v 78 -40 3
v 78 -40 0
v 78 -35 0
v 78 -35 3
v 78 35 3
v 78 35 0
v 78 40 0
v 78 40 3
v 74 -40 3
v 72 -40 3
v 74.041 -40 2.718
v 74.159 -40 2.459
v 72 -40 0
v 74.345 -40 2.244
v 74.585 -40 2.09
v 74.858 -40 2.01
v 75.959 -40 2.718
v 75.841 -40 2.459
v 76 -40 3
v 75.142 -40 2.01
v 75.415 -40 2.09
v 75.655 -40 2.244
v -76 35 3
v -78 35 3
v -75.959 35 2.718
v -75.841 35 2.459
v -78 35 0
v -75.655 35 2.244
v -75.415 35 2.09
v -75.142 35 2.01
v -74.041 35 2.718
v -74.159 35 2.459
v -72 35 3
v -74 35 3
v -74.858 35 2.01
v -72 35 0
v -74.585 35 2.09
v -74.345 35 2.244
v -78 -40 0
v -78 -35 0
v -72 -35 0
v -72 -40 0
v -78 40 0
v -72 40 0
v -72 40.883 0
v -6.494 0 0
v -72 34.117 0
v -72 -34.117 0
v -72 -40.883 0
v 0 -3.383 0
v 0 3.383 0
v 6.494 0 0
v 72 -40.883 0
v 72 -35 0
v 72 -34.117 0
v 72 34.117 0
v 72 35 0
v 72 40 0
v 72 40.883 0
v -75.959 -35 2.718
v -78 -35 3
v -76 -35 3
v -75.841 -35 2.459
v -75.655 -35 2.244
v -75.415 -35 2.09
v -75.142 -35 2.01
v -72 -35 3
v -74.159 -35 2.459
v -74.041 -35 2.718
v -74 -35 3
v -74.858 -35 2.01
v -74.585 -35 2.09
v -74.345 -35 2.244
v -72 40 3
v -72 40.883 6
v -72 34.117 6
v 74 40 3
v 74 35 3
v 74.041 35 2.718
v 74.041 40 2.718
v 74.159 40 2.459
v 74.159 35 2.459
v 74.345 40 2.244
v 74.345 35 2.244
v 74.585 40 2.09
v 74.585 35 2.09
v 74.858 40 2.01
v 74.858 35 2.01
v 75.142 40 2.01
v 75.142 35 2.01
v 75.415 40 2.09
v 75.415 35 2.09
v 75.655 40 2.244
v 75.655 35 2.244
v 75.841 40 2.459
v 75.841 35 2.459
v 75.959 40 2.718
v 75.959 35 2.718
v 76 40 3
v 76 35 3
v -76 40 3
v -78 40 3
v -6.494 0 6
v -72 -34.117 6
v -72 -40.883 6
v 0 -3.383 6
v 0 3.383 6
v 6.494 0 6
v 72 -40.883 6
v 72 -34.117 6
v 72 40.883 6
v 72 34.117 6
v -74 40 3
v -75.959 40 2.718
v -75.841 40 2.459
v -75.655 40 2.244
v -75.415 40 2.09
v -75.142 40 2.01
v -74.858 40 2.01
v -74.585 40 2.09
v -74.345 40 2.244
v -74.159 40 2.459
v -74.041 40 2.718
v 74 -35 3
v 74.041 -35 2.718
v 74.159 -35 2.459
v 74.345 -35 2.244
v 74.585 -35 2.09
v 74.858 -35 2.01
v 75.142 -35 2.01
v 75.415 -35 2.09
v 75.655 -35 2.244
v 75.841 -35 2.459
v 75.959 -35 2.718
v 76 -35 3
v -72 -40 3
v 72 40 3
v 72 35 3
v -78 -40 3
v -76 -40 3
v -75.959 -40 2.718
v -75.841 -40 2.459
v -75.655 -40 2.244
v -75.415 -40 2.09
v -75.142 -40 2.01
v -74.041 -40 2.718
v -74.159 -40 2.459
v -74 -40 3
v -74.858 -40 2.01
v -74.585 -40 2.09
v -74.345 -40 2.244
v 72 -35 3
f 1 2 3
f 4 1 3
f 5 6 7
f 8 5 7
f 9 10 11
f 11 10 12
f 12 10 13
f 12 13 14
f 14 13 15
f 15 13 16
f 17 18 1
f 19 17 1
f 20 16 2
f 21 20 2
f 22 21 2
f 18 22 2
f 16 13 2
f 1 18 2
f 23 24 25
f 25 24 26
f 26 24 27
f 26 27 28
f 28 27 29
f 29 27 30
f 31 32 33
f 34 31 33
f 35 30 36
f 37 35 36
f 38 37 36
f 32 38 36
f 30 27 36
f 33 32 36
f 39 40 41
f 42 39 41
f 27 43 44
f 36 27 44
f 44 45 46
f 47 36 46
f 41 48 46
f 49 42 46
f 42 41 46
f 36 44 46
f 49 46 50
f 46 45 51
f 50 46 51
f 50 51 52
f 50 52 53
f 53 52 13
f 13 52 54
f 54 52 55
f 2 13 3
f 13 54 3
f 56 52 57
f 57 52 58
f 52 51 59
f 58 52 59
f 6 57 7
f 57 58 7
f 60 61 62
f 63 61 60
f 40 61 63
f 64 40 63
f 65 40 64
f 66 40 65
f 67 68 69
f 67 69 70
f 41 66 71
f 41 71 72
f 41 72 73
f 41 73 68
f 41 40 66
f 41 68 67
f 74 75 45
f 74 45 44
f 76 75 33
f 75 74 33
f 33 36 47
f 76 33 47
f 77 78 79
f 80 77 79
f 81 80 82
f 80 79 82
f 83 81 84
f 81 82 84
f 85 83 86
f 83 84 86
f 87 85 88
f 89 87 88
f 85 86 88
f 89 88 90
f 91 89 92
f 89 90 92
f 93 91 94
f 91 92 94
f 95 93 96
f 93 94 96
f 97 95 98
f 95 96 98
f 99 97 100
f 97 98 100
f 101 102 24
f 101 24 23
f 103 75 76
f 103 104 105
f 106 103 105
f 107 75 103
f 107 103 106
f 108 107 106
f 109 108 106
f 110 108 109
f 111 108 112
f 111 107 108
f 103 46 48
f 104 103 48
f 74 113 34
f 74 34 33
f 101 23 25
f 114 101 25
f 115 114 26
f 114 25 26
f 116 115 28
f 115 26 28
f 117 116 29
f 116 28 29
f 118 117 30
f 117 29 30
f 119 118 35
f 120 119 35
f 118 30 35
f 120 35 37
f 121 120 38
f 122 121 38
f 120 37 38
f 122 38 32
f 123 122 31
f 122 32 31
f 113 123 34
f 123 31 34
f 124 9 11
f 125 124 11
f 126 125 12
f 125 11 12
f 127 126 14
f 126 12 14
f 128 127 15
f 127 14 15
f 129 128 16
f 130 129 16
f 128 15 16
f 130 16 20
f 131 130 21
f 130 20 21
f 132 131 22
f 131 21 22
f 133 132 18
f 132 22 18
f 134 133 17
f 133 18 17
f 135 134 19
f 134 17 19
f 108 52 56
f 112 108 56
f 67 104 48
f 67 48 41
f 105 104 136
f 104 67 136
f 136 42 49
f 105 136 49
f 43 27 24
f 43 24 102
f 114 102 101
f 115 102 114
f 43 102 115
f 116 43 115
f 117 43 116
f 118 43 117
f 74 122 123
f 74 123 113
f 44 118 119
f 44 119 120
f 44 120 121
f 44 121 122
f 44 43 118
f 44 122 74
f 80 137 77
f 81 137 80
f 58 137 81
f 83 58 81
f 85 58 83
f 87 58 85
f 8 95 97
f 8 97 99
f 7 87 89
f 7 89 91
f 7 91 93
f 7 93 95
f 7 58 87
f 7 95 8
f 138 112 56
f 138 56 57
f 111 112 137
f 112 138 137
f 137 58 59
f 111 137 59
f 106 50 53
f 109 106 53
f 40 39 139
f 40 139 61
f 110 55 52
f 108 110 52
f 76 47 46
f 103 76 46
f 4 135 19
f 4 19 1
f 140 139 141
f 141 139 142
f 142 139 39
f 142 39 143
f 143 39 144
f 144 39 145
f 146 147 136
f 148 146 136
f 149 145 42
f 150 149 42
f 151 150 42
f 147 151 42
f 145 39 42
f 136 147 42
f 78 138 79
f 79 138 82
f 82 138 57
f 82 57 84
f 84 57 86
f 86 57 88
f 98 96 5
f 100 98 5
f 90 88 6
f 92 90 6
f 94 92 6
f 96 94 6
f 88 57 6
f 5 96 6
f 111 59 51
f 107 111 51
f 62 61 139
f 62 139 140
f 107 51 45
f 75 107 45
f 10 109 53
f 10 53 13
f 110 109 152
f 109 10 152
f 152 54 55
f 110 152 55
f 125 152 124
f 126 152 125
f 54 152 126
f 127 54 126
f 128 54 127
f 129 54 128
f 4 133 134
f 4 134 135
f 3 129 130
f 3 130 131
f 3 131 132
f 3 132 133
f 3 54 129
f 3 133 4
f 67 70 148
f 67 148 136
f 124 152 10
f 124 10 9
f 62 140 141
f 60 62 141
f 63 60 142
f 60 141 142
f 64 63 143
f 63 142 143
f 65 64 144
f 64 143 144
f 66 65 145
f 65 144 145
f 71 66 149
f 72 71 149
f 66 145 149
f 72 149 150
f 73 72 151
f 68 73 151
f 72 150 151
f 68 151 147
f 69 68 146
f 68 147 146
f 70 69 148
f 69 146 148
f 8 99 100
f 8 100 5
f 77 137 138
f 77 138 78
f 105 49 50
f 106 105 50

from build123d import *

# Parameters (mm, degrees)
F1_DEPTH = 6
F2_W     = 6
F2_H     = 5
F3_DEPTH = 3
F4_R     = 1
F5_DEPTH = 100


with BuildPart() as f1:
    # F0 (on Top) → F1 (new body)
    with BuildSketch(Plane.XY):
        Polygon((0, 3.382515), (-72, 40.882515), (-72, 34.117485), (-6.494428, 0), (-72, -34.117485), (-72, -40.882515), (0, -3.382515), (72, -40.882515), (72, -34.117485), (6.494428, 0), (72, 34.117485), (72, 40.882515), align=None)
    extrude(amount=F1_DEPTH)

    # F2 (on Top) → F3 (join)
    with BuildSketch(Plane.XY):
        with Locations((-75, 37.5)):
            Rectangle(F2_W, F2_H)
        with Locations((-75, -37.5)):
            Rectangle(F2_W, F2_H)
        with Locations((75, -37.5)):
            Rectangle(F2_W, F2_H)
        with Locations((75, 37.5)):
            Rectangle(F2_W, F2_H)
    extrude(amount=F3_DEPTH)

    # F4 (on face) → F5 (cut)
    with BuildSketch(Plane.XZ.offset(40)):
        with BuildLine():
            ThreePointArc((-76, 3), (-75, 2), (-74, 3))
            Line((-74, 3), (-76, 3))
        make_face()
        with Locations((75, 3)):
            Circle(F4_R)
    extrude(amount=-F5_DEPTH, mode=Mode.SUBTRACT)


solid = f1.part
